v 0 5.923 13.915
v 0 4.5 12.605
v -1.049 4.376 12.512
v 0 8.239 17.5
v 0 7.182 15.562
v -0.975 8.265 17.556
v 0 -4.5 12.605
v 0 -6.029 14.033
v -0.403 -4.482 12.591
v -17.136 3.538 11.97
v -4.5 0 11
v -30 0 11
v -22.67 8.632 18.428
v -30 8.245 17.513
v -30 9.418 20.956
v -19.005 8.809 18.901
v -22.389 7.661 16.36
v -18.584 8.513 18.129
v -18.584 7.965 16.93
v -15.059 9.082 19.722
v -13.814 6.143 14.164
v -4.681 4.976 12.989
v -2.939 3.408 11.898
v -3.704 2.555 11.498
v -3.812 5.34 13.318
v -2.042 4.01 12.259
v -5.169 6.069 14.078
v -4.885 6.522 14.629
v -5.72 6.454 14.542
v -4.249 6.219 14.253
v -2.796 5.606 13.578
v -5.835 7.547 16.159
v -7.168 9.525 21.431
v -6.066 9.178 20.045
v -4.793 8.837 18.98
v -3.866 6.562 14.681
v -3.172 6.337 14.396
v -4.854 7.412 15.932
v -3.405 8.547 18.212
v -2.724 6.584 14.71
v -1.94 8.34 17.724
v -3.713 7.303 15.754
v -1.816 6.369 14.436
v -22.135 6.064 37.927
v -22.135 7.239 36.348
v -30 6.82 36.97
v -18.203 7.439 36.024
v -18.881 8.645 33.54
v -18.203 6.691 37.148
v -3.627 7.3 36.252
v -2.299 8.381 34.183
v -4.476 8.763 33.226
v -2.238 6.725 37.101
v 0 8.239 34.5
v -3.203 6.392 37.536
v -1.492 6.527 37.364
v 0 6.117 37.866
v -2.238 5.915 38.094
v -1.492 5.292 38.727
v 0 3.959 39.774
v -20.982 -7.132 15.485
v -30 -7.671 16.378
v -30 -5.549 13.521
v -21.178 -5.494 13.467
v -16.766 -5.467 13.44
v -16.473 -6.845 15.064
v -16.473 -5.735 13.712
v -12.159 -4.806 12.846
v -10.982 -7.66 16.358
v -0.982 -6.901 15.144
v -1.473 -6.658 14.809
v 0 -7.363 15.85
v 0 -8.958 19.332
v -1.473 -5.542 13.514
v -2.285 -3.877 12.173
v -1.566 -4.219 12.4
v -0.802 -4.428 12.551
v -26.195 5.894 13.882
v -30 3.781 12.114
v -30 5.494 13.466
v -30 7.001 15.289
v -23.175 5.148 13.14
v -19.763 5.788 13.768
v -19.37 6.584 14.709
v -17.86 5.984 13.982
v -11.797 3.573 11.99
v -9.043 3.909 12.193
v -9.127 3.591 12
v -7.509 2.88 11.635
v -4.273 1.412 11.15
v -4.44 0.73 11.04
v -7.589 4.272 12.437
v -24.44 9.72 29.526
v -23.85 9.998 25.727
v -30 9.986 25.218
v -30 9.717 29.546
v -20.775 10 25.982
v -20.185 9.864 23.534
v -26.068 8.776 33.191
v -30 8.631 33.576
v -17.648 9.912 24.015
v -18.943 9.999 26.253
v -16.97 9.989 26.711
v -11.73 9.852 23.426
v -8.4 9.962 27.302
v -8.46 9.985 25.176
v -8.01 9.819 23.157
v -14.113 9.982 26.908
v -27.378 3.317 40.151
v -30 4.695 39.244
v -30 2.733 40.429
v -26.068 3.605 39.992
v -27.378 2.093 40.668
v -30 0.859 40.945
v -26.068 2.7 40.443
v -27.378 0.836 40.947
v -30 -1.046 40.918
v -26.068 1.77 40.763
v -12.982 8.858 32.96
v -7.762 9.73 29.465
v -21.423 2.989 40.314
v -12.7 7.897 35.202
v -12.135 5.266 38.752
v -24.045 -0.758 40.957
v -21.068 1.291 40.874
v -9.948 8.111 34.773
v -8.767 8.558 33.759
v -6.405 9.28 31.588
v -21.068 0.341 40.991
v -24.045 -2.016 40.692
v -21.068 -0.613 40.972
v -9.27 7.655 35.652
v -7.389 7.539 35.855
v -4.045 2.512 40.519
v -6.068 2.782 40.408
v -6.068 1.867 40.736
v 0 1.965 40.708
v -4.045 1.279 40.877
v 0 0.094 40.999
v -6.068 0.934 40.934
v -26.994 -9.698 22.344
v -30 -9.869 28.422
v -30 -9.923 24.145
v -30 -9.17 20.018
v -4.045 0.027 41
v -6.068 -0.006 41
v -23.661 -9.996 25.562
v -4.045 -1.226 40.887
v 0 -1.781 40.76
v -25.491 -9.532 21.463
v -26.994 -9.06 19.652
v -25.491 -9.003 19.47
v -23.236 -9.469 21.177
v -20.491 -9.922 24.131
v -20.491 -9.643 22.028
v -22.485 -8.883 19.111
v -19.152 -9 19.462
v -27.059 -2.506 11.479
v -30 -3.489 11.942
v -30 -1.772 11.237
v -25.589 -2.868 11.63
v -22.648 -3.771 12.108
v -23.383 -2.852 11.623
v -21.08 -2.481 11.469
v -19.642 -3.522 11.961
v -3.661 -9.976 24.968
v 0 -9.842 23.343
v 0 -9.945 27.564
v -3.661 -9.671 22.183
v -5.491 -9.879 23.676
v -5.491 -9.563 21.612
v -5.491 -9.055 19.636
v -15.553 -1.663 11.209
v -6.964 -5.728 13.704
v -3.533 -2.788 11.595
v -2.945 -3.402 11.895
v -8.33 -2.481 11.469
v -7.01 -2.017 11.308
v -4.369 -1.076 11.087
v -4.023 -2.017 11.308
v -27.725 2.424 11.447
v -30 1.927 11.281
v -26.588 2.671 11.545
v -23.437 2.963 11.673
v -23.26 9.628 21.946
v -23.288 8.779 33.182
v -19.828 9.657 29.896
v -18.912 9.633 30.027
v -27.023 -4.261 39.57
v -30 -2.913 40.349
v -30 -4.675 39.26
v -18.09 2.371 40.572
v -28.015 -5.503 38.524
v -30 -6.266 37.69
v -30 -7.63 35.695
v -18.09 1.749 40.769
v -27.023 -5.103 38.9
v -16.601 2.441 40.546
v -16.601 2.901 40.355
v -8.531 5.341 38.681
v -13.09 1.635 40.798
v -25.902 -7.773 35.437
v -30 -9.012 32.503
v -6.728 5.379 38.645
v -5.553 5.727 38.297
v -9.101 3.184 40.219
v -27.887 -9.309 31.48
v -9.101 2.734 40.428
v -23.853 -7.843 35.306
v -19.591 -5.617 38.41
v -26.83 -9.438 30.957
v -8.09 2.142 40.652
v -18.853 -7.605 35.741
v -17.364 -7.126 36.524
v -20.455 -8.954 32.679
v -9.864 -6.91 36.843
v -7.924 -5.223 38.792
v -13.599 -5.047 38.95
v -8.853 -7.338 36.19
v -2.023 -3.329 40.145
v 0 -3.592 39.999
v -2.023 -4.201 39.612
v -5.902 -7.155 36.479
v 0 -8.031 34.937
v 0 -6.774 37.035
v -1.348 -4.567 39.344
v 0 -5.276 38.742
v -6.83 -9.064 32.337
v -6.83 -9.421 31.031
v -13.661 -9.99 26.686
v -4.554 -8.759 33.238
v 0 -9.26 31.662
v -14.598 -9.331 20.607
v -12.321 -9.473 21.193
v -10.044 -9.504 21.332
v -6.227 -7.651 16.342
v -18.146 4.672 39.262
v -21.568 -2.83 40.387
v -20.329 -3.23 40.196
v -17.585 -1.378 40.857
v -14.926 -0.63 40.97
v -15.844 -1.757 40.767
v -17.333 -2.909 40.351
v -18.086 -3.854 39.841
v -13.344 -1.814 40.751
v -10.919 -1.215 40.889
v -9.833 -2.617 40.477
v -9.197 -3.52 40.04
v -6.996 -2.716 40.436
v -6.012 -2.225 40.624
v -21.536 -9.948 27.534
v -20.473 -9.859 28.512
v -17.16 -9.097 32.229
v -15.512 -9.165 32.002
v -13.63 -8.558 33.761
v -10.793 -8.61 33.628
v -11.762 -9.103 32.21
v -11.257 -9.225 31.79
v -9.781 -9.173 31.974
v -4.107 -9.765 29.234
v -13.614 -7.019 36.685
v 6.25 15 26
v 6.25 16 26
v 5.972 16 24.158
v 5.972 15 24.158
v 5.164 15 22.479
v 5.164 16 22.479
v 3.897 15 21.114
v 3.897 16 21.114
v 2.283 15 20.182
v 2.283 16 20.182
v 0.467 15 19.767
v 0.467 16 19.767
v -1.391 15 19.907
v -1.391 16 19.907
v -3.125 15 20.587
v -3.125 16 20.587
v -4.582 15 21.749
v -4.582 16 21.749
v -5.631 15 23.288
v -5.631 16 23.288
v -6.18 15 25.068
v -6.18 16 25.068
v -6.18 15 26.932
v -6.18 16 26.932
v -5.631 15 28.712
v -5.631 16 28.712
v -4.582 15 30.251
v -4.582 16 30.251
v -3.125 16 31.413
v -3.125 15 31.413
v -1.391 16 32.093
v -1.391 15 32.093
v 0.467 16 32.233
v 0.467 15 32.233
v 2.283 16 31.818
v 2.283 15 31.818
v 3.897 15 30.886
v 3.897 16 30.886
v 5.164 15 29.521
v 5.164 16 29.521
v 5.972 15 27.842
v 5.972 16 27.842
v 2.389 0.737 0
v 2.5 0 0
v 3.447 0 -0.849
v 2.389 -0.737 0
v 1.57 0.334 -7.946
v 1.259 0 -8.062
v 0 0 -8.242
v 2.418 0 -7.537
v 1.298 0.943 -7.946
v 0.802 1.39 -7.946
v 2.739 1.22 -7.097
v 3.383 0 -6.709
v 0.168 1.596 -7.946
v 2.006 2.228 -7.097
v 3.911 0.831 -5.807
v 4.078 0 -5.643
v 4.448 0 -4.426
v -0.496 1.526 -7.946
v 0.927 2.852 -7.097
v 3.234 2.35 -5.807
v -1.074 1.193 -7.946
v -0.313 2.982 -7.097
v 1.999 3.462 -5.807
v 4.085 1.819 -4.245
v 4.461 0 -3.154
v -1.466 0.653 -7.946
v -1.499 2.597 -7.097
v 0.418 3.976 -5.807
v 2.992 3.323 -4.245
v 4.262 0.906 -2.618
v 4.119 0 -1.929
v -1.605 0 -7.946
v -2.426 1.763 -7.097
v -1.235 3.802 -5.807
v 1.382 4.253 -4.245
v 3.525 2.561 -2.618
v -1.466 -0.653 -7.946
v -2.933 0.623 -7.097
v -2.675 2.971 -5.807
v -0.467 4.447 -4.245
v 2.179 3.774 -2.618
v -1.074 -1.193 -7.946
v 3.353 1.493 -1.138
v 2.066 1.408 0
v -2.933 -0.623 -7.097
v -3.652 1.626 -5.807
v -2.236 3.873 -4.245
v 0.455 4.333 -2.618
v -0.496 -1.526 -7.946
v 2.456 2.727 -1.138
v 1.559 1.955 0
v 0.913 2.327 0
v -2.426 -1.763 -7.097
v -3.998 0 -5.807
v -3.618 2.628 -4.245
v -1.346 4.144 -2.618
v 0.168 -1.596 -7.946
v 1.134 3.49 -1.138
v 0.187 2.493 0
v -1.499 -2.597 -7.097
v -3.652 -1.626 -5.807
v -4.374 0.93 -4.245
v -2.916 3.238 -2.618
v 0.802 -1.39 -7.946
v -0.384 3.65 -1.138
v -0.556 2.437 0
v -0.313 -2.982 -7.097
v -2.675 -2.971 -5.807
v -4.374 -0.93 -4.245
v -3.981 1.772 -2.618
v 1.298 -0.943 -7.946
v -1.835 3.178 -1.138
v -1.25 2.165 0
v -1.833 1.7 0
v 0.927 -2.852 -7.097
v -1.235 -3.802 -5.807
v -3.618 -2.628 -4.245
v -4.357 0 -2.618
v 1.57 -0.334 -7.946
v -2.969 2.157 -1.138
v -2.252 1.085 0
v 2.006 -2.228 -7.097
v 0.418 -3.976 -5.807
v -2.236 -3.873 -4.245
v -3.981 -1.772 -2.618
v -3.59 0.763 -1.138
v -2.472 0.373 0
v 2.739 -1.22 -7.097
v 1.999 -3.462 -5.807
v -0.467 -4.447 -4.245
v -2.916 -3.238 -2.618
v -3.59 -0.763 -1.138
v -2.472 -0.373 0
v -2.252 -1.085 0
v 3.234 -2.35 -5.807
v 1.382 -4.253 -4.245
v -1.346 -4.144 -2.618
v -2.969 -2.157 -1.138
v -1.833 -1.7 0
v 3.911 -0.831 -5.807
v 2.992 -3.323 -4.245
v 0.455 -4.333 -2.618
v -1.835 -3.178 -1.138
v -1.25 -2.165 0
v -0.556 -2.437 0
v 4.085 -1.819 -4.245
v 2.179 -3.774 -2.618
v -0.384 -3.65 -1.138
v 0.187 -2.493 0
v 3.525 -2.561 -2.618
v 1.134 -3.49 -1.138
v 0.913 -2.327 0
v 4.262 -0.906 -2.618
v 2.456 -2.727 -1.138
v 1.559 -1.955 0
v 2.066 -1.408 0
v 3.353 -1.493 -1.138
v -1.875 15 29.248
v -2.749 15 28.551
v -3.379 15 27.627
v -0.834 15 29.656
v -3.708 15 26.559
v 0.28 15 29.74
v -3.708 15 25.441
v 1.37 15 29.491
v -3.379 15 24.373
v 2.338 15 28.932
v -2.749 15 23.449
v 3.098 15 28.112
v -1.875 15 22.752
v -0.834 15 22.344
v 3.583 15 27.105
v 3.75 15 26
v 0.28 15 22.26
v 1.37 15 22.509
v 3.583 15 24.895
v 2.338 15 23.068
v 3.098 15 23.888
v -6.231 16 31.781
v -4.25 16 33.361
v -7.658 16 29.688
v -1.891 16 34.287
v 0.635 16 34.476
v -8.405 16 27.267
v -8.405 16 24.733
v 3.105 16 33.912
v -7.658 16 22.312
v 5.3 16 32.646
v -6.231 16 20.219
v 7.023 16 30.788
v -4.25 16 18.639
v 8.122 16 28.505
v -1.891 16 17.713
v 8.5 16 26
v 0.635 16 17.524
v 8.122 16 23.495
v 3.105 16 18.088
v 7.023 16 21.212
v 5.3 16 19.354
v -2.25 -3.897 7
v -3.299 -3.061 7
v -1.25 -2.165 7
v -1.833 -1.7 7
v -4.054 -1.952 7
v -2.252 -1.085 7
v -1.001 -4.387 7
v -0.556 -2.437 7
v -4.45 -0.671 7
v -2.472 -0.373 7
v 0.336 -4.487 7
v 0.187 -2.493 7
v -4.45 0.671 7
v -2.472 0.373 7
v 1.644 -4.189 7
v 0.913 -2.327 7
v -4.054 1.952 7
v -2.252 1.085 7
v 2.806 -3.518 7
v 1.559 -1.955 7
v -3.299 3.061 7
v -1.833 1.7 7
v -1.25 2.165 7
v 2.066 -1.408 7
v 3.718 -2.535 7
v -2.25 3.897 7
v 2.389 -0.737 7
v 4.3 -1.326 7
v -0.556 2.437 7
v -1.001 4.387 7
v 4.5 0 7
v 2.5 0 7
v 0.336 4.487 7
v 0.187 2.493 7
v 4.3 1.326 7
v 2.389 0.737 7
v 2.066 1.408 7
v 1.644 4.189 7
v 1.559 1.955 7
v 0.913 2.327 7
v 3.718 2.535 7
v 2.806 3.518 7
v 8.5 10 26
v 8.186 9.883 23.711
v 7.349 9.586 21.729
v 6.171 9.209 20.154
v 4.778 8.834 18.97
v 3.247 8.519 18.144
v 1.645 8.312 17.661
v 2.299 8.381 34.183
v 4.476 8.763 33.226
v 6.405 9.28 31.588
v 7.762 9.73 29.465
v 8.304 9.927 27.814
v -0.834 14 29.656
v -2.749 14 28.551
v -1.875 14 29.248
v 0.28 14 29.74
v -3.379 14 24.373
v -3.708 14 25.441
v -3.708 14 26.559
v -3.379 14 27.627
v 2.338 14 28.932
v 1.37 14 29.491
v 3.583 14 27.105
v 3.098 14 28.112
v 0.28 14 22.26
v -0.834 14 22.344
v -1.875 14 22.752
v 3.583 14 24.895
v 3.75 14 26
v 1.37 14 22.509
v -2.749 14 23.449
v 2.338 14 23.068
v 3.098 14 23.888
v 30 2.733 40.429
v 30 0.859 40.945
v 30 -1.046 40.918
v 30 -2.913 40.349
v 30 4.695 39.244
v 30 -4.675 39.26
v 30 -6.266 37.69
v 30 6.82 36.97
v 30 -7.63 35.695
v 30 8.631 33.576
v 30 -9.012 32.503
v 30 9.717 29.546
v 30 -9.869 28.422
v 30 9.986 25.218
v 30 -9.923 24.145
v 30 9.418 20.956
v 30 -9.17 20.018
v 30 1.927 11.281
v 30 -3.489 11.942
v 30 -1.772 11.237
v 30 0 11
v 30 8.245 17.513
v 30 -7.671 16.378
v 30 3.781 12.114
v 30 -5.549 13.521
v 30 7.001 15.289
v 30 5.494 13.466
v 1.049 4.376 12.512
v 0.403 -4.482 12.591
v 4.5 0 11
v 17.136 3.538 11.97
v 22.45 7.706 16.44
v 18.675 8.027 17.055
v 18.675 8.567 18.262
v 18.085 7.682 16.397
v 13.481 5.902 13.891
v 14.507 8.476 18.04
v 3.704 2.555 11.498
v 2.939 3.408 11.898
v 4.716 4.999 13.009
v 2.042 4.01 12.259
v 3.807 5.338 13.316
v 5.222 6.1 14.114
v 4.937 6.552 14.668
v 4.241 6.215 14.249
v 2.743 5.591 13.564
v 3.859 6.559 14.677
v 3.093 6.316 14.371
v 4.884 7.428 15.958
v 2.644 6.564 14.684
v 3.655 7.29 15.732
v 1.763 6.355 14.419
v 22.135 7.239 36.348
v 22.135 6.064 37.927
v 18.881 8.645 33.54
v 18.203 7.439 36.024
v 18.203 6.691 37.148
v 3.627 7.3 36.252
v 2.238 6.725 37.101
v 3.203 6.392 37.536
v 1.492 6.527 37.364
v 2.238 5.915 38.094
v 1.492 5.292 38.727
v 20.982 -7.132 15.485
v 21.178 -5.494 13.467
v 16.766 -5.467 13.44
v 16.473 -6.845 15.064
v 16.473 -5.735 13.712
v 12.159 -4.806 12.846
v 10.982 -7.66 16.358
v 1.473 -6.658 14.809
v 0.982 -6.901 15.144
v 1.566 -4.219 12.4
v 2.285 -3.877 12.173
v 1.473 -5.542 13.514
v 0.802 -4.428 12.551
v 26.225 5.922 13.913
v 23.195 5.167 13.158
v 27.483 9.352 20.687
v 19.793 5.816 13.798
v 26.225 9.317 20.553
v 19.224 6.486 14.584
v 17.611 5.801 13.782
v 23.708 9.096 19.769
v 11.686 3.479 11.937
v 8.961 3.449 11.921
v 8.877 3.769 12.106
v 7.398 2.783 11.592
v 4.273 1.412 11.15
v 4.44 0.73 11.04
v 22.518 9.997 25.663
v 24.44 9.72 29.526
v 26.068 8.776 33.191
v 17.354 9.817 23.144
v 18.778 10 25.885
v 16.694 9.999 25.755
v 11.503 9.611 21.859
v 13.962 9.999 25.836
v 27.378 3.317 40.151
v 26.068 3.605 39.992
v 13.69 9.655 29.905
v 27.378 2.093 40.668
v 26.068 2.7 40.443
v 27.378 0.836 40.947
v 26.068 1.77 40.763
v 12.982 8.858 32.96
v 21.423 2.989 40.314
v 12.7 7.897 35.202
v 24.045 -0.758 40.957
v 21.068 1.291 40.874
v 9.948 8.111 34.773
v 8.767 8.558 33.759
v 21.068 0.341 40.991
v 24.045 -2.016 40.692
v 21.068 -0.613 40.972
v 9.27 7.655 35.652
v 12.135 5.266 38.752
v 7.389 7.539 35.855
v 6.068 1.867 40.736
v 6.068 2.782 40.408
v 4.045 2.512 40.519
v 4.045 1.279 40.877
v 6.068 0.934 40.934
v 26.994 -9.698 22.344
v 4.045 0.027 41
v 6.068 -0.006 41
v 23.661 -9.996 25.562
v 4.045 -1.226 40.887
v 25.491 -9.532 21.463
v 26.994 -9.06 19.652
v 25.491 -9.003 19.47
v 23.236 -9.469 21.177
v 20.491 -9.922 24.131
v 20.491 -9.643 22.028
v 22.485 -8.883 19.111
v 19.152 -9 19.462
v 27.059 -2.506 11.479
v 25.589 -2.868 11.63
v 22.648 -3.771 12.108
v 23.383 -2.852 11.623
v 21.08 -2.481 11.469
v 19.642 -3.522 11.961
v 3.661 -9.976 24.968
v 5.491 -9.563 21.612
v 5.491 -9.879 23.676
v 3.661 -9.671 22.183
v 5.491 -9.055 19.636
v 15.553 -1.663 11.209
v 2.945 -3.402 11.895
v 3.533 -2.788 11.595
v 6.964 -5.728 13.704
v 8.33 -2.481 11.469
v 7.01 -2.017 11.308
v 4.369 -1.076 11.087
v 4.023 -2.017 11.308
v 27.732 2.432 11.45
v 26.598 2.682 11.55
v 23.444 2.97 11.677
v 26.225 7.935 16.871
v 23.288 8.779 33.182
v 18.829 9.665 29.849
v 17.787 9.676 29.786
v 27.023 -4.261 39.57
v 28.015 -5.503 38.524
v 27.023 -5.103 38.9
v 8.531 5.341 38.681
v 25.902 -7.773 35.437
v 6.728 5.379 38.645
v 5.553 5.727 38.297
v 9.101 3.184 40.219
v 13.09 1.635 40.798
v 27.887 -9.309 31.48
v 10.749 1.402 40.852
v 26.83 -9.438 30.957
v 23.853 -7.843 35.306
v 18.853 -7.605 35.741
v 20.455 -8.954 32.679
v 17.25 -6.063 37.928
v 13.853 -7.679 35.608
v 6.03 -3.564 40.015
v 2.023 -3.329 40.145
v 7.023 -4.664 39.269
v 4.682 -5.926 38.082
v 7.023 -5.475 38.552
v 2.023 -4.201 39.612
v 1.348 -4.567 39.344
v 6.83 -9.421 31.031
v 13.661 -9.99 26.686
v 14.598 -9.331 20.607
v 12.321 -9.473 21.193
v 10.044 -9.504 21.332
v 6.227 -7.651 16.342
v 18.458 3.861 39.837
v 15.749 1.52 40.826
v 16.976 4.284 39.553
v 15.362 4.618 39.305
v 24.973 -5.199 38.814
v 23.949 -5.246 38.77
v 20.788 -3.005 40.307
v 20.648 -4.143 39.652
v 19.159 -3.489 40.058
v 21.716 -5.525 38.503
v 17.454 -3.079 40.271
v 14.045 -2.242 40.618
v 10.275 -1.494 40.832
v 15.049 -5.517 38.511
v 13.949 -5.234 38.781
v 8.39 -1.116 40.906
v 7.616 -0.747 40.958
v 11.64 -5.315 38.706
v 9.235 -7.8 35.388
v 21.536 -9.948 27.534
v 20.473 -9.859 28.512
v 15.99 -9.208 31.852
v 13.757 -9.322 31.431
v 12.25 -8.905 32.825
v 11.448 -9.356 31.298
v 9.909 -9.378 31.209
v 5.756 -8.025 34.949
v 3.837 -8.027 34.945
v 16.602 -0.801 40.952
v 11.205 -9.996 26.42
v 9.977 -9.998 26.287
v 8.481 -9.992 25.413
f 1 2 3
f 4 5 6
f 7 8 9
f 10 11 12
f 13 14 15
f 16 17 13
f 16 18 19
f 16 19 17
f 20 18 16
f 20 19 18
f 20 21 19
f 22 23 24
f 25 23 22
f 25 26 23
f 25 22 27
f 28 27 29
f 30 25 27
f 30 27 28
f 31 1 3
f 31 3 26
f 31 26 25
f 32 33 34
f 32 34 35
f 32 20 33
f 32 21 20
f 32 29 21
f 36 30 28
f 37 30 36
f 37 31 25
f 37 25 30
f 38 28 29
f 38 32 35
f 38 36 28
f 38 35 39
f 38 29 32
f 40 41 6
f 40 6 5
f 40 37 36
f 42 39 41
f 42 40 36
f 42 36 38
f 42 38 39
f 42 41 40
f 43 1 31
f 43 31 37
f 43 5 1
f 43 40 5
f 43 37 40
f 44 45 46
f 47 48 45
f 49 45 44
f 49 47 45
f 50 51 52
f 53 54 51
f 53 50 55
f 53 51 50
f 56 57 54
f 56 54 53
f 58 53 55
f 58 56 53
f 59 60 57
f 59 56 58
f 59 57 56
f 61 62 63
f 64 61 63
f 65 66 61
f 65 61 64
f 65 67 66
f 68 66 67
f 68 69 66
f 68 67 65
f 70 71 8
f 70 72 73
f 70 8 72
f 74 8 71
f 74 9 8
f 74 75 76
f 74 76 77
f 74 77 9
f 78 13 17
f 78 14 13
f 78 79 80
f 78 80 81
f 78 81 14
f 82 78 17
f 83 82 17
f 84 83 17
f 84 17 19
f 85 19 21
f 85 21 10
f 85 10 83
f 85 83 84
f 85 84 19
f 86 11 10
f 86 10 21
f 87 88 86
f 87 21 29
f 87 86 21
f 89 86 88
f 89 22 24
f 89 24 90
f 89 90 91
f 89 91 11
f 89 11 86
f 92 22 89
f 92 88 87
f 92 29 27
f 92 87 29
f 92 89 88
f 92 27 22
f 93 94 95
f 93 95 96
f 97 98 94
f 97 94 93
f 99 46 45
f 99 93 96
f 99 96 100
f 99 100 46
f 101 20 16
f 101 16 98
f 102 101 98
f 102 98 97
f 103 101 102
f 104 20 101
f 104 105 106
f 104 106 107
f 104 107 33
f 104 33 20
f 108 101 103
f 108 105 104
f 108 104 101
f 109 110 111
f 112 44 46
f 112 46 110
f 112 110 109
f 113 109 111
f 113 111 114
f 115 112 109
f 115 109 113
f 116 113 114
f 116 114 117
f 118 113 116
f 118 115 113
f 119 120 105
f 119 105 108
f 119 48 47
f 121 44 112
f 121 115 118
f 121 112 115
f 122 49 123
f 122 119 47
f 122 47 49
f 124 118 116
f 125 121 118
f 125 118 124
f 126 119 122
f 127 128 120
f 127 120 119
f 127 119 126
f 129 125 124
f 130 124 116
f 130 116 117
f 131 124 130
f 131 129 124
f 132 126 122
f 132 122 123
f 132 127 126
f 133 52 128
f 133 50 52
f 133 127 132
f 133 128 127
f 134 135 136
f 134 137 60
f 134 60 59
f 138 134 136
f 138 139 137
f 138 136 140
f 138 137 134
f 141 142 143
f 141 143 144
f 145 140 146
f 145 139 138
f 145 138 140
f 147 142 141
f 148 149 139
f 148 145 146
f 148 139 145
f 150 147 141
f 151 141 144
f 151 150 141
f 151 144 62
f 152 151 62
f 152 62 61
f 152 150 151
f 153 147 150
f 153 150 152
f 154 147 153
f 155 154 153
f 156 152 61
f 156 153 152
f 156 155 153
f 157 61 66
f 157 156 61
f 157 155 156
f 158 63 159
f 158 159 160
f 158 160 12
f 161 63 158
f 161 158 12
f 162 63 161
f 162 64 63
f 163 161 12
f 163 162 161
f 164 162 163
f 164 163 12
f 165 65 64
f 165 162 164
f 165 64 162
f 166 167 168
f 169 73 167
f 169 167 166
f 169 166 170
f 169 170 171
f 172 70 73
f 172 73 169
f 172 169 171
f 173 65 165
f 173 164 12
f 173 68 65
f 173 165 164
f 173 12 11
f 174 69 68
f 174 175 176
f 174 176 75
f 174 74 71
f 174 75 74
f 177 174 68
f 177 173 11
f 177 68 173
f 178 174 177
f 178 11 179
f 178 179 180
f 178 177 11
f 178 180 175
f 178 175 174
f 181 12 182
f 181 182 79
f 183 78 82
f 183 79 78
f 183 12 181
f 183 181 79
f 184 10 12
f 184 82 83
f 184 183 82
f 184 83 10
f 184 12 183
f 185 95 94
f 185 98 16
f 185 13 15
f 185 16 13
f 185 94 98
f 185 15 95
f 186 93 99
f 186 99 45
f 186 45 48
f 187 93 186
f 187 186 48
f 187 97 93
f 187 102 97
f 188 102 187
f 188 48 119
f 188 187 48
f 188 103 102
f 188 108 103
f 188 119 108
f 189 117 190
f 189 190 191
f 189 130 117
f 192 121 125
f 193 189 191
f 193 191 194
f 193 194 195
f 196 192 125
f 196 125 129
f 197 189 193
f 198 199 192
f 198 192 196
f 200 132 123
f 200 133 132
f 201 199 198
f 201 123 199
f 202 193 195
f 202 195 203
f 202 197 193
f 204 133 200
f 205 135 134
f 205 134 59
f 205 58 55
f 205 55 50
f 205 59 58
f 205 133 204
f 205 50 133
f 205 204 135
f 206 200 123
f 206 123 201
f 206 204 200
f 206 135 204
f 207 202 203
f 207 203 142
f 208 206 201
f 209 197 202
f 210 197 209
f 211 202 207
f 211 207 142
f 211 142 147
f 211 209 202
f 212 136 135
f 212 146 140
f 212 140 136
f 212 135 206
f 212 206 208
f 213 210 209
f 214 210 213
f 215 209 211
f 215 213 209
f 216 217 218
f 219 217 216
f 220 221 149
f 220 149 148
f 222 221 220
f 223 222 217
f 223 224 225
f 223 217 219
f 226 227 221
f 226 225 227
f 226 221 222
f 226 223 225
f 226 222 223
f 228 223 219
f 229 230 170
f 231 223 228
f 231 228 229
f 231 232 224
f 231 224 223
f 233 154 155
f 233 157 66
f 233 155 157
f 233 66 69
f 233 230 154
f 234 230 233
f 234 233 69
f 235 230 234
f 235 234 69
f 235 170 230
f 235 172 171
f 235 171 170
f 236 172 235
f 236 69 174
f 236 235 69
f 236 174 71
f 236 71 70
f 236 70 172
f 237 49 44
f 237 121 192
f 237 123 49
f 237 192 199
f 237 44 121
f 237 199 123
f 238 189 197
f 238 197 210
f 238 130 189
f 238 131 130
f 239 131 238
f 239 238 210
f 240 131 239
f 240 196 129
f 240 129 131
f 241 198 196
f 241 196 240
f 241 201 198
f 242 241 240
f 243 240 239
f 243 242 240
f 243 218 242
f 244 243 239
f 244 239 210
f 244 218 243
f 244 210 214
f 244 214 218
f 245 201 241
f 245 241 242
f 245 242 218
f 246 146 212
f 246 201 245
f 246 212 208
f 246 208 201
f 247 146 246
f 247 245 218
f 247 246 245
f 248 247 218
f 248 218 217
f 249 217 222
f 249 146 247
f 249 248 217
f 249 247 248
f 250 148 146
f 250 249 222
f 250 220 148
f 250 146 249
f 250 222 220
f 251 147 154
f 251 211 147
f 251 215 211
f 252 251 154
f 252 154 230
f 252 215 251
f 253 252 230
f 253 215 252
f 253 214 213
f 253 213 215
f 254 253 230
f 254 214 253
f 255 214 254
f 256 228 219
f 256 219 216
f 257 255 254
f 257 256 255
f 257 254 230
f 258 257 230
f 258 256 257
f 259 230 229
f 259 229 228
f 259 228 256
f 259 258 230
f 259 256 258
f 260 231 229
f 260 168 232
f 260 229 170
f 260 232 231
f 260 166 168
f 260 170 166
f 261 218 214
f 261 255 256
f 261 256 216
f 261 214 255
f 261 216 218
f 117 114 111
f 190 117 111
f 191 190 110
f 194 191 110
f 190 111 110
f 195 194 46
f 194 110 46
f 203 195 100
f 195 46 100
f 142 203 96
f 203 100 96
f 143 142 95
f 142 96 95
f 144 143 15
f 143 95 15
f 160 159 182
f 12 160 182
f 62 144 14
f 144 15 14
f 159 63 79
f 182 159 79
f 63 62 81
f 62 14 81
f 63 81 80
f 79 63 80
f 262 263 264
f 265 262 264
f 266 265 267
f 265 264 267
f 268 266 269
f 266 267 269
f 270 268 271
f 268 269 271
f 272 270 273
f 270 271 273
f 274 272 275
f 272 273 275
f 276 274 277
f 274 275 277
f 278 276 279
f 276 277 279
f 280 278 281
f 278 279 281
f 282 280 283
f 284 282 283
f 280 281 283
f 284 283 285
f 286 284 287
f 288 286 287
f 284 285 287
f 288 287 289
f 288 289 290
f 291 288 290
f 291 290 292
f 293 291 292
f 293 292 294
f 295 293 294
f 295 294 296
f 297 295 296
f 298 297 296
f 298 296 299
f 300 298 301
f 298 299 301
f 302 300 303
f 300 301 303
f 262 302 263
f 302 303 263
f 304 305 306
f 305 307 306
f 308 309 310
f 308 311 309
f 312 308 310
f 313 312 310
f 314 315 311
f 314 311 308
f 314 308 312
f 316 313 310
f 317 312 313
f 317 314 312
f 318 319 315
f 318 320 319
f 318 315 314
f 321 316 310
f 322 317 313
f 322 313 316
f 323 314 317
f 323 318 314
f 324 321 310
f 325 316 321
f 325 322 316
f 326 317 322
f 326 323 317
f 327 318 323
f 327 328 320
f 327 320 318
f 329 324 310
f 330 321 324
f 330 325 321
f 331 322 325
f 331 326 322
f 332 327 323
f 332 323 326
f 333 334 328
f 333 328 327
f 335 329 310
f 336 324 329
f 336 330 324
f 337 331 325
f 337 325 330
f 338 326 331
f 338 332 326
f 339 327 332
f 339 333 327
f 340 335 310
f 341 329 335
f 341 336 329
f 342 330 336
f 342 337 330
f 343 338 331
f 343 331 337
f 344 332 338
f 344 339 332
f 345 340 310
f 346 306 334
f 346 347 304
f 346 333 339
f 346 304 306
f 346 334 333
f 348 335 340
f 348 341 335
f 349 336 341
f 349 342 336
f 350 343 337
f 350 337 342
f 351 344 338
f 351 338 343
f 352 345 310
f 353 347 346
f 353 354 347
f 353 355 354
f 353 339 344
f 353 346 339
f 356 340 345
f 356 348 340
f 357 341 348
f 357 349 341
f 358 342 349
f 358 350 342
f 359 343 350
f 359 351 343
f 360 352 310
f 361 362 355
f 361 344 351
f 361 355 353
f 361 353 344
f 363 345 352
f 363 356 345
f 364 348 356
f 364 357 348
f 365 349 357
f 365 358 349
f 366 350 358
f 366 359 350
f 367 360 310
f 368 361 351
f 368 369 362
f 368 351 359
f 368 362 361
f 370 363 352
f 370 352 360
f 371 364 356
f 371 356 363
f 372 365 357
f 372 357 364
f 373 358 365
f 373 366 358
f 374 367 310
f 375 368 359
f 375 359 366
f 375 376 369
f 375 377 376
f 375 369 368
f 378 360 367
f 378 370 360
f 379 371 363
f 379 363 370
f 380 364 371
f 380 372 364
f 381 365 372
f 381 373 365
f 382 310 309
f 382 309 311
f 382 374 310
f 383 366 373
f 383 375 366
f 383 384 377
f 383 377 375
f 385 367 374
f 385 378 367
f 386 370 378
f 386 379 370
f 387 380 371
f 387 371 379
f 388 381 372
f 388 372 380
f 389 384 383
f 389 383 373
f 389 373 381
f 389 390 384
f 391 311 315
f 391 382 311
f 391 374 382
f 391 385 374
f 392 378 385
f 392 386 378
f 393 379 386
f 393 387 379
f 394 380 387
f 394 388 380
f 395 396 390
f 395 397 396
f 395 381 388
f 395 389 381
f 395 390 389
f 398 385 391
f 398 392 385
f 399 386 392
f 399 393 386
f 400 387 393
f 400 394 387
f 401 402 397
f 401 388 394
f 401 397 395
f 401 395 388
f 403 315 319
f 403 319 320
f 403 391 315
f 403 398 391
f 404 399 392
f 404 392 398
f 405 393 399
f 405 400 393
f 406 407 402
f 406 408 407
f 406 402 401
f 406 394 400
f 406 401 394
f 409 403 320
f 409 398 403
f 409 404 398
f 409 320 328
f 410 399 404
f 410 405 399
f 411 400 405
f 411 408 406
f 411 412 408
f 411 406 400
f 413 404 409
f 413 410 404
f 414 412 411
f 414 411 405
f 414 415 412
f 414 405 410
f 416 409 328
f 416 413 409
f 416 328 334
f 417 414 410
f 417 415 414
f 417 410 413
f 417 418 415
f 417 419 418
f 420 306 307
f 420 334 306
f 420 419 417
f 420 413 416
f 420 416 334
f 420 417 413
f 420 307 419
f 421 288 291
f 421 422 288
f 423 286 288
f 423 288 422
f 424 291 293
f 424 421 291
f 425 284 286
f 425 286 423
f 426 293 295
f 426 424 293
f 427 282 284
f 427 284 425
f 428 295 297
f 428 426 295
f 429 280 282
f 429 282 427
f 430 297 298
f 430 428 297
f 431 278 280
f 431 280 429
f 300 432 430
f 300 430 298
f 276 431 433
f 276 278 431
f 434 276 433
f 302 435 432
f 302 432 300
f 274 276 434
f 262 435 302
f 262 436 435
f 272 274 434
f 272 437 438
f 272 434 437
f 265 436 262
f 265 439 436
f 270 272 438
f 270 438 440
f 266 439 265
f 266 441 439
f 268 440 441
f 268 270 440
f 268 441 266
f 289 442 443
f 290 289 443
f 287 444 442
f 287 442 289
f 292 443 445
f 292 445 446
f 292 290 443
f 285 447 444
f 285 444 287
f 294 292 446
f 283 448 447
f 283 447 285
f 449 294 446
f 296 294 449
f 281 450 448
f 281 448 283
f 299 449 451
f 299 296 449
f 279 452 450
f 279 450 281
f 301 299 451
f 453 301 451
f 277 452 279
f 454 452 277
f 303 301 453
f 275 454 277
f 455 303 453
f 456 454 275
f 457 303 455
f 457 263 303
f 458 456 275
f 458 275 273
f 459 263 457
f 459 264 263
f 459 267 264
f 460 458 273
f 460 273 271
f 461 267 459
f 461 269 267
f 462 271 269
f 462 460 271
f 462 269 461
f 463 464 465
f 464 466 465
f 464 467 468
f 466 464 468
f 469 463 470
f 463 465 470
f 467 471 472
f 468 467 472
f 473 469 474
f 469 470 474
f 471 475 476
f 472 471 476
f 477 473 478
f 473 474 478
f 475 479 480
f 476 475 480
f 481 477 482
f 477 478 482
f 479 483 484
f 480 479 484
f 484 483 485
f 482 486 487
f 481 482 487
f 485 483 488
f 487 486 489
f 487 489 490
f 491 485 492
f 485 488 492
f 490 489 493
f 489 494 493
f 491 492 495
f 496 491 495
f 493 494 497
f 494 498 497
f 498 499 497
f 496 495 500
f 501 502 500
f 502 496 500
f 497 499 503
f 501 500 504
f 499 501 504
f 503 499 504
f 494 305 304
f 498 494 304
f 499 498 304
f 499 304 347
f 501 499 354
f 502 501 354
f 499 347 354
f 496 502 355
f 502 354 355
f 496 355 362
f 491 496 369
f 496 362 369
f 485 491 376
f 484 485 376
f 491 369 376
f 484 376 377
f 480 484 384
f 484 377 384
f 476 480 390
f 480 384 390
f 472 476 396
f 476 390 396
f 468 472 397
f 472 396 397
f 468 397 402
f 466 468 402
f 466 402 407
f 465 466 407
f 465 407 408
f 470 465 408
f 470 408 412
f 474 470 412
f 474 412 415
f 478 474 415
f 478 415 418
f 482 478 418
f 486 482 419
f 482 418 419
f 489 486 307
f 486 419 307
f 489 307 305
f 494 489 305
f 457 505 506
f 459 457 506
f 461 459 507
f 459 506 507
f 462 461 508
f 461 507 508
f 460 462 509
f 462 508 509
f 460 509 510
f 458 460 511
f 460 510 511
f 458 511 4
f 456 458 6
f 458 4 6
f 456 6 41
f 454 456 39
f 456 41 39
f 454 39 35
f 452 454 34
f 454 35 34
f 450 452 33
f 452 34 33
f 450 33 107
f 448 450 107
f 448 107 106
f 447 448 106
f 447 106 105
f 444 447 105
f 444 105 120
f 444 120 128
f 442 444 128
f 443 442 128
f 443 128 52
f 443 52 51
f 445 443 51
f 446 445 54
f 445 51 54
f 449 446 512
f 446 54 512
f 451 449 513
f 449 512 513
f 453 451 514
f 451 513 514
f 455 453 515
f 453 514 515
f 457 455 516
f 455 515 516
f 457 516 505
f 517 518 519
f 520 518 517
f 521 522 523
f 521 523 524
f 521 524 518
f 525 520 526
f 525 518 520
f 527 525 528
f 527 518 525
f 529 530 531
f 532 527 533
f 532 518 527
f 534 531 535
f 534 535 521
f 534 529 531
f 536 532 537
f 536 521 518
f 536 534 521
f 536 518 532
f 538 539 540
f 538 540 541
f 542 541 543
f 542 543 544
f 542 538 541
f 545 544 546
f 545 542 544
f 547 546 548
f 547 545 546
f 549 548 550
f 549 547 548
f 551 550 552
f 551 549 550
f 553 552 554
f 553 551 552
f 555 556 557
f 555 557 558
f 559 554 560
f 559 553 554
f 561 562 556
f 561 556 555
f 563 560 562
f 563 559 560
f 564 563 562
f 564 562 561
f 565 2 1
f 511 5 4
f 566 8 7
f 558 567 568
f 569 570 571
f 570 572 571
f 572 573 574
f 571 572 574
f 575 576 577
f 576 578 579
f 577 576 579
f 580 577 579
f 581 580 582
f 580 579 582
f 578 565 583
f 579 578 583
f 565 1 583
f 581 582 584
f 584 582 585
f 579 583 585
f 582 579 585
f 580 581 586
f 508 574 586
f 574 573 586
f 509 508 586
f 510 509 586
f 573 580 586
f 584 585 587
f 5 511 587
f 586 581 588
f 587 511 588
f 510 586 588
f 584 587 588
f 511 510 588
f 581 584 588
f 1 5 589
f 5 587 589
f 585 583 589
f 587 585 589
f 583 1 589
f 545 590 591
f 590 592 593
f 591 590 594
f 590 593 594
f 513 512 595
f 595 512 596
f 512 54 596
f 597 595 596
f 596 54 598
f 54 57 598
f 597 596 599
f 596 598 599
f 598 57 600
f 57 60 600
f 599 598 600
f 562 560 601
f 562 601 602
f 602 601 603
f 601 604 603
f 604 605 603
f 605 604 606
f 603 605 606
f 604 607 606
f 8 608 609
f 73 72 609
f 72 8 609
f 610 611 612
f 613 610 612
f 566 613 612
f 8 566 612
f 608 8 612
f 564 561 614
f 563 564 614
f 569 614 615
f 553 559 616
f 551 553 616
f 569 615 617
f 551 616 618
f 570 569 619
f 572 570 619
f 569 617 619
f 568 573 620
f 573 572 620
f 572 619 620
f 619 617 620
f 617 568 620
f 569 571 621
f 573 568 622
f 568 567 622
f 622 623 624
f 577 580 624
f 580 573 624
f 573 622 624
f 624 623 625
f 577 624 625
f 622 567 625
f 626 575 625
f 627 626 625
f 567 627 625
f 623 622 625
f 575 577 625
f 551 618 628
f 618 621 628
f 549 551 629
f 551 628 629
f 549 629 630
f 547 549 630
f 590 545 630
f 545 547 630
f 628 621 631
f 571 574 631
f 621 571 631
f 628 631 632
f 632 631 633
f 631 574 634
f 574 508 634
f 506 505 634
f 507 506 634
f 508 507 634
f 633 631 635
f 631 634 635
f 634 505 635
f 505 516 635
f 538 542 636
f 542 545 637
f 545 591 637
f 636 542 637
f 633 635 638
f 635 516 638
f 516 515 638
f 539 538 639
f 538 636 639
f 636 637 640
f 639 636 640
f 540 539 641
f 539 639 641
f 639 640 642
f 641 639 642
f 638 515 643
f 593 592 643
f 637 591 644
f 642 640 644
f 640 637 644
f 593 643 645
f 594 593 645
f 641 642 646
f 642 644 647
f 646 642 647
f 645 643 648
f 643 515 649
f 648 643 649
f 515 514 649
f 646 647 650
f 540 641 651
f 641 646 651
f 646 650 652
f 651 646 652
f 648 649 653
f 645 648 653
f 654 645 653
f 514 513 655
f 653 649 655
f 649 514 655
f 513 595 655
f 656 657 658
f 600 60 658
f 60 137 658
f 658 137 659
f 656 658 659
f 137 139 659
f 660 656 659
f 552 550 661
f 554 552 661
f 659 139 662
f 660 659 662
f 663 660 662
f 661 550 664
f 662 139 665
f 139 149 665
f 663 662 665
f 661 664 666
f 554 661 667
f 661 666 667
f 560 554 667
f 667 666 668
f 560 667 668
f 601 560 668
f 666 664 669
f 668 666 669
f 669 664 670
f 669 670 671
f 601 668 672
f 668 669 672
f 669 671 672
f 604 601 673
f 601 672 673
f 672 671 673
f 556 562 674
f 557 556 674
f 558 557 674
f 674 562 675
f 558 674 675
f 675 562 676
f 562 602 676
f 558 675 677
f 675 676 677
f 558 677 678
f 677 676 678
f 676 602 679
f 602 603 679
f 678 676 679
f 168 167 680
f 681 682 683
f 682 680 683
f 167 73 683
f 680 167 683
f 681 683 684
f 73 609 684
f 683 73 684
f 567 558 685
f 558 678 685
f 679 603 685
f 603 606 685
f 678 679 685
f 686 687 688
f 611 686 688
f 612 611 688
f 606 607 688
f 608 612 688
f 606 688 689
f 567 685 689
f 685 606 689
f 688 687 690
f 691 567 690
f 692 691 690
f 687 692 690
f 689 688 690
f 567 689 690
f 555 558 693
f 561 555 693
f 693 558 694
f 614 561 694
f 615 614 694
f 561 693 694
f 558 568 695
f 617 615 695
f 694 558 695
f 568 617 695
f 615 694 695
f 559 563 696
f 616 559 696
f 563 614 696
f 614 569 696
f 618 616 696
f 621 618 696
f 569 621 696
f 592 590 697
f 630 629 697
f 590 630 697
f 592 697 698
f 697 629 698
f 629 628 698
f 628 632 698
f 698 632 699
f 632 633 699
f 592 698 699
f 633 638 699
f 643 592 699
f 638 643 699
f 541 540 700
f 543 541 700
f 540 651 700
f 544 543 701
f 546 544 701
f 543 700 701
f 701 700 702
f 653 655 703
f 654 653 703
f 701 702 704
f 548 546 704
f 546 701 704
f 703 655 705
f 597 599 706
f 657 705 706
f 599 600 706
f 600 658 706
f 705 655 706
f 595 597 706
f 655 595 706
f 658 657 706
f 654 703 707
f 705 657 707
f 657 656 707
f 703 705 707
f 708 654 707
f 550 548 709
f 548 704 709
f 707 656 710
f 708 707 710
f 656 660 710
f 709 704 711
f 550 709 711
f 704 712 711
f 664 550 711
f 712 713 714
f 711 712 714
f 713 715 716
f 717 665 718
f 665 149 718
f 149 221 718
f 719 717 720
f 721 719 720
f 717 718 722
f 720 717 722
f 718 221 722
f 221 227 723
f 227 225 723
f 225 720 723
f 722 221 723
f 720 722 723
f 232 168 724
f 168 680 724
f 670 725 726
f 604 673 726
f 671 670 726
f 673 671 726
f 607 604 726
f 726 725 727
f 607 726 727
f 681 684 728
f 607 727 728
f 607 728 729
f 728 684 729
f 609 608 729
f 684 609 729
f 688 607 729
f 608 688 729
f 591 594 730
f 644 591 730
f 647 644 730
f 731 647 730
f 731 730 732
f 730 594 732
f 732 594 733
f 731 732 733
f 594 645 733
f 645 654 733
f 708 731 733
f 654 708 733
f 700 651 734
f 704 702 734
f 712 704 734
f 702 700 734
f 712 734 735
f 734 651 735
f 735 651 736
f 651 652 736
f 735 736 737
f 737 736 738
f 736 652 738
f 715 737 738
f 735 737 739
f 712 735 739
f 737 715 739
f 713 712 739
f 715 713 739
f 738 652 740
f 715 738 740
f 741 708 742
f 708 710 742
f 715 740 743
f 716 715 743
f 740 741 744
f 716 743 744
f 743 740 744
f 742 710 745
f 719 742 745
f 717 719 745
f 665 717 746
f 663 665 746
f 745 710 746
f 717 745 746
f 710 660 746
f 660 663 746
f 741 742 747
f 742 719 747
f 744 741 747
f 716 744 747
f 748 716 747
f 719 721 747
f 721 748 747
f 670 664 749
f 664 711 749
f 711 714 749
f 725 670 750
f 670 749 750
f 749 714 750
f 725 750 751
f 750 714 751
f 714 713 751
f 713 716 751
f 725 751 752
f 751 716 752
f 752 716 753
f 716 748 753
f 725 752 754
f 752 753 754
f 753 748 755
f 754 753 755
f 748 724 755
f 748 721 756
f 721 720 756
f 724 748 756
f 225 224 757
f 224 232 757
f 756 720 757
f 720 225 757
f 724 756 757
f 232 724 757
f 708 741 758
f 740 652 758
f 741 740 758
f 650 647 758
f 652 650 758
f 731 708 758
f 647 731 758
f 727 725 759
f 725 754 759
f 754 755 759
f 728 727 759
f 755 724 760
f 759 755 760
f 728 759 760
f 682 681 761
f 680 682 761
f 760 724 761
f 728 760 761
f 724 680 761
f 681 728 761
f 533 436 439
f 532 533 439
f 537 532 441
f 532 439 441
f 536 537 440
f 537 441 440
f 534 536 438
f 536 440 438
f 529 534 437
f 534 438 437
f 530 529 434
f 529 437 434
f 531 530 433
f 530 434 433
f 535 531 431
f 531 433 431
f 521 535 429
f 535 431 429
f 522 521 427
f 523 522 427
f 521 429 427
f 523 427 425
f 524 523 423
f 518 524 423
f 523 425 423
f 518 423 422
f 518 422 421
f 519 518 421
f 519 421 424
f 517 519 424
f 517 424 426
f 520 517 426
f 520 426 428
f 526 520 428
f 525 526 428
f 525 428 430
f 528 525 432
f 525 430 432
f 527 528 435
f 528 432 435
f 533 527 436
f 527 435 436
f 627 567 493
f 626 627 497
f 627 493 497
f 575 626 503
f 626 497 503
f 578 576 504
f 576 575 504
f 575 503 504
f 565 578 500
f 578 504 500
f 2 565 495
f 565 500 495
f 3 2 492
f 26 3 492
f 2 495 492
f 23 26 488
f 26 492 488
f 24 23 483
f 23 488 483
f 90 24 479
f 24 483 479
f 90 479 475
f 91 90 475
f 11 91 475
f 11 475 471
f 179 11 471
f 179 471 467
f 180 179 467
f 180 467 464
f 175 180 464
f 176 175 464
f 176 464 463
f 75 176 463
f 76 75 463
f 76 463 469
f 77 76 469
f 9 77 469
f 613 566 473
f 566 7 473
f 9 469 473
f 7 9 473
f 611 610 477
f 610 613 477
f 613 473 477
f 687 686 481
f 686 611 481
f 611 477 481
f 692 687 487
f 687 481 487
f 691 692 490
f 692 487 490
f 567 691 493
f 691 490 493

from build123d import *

# Parameters (mm, degrees)
SKETCH_1_R           = 2.5
EXTRUDE_1_DEPTH      = 7
SKETCH_2_R           = 4.5
EXTRUDE_2_DEPTH      = 10
SKETCH_3_RX          = 15
SKETCH_3_RY          = 10
EXTRUDE_3_DEPTH      = 30
EXTRUDE_3_DEPTH_BACK = 30
SKETCH_4_R           = 8.5
EXTRUDE_4_DEPTH      = 16
SKETCH_5_R           = 6.25
CUT_EXTRUDE_1_DEPTH  = 1
SKETCH_6_R           = 3.75
CUT_EXTRUDE_2_DEPTH  = 1


with BuildPart() as part:
    # Sketch 1 → Extrude 1 (new body)
    with BuildSketch(Plane.XY):
        Circle(SKETCH_1_R)
    extrude(amount=EXTRUDE_1_DEPTH)

    # Sketch 2 → Extrude 2 (add)
    with BuildSketch(Plane.XY.offset(7)):
        Circle(SKETCH_2_R)
    extrude(amount=EXTRUDE_2_DEPTH)

    # Sketch 3 → Extrude 3 (add, two sides)
    with BuildSketch(Plane(origin=(0, 0, 0), x_dir=(0, 0, -1), z_dir=(1, 0, 0))) as extrude_3_sk:
        with Locations((-26, 0)):
            Ellipse(SKETCH_3_RX, SKETCH_3_RY)
    extrude(amount=EXTRUDE_3_DEPTH)
    extrude(extrude_3_sk.sketch, amount=-EXTRUDE_3_DEPTH_BACK)

    # Sketch 4 → Extrude 4 (add)
    with BuildSketch(Plane(origin=(0, 0, 0), x_dir=(1, 0, 0), z_dir=(0, 1, 0))):
        with Locations((0, -26)):
            Circle(SKETCH_4_R)
    extrude(amount=EXTRUDE_4_DEPTH)

    # Sketch 5 → Cut-Extrude 1 (cut)
    with BuildSketch(Plane(origin=(0, 16, 0), x_dir=(1, 0, 0), z_dir=(0, 1, 0))):
        with Locations((0, -26)):
            Circle(SKETCH_5_R)
    extrude(amount=-CUT_EXTRUDE_1_DEPTH, mode=Mode.SUBTRACT)

    # Sketch 6 → Cut-Extrude 2 (cut)
    with BuildSketch(Plane(origin=(0, 15, 0), x_dir=(1, 0, 0), z_dir=(0, 1, 0))):
        with Locations((0, -26)):
            Circle(SKETCH_6_R)
    extrude(amount=-CUT_EXTRUDE_2_DEPTH, mode=Mode.SUBTRACT)

    # Sketch 7 → Revolve 3 (revolve)
    with BuildSketch(Plane(origin=(0, 0, 0), x_dir=(1, 0, 0), z_dir=(0, 1, 0))):
        with BuildLine():
            Line((0, -0.758342613), (0, 8.241657387))
            ThreePointArc((0, 8.241657387), (4.5, 3.741657387), (0, -0.758342613))
        make_face()
    revolve(axis=Axis((0, 0, -10.703740256), (0, 0, 1)))


solid = part.part
